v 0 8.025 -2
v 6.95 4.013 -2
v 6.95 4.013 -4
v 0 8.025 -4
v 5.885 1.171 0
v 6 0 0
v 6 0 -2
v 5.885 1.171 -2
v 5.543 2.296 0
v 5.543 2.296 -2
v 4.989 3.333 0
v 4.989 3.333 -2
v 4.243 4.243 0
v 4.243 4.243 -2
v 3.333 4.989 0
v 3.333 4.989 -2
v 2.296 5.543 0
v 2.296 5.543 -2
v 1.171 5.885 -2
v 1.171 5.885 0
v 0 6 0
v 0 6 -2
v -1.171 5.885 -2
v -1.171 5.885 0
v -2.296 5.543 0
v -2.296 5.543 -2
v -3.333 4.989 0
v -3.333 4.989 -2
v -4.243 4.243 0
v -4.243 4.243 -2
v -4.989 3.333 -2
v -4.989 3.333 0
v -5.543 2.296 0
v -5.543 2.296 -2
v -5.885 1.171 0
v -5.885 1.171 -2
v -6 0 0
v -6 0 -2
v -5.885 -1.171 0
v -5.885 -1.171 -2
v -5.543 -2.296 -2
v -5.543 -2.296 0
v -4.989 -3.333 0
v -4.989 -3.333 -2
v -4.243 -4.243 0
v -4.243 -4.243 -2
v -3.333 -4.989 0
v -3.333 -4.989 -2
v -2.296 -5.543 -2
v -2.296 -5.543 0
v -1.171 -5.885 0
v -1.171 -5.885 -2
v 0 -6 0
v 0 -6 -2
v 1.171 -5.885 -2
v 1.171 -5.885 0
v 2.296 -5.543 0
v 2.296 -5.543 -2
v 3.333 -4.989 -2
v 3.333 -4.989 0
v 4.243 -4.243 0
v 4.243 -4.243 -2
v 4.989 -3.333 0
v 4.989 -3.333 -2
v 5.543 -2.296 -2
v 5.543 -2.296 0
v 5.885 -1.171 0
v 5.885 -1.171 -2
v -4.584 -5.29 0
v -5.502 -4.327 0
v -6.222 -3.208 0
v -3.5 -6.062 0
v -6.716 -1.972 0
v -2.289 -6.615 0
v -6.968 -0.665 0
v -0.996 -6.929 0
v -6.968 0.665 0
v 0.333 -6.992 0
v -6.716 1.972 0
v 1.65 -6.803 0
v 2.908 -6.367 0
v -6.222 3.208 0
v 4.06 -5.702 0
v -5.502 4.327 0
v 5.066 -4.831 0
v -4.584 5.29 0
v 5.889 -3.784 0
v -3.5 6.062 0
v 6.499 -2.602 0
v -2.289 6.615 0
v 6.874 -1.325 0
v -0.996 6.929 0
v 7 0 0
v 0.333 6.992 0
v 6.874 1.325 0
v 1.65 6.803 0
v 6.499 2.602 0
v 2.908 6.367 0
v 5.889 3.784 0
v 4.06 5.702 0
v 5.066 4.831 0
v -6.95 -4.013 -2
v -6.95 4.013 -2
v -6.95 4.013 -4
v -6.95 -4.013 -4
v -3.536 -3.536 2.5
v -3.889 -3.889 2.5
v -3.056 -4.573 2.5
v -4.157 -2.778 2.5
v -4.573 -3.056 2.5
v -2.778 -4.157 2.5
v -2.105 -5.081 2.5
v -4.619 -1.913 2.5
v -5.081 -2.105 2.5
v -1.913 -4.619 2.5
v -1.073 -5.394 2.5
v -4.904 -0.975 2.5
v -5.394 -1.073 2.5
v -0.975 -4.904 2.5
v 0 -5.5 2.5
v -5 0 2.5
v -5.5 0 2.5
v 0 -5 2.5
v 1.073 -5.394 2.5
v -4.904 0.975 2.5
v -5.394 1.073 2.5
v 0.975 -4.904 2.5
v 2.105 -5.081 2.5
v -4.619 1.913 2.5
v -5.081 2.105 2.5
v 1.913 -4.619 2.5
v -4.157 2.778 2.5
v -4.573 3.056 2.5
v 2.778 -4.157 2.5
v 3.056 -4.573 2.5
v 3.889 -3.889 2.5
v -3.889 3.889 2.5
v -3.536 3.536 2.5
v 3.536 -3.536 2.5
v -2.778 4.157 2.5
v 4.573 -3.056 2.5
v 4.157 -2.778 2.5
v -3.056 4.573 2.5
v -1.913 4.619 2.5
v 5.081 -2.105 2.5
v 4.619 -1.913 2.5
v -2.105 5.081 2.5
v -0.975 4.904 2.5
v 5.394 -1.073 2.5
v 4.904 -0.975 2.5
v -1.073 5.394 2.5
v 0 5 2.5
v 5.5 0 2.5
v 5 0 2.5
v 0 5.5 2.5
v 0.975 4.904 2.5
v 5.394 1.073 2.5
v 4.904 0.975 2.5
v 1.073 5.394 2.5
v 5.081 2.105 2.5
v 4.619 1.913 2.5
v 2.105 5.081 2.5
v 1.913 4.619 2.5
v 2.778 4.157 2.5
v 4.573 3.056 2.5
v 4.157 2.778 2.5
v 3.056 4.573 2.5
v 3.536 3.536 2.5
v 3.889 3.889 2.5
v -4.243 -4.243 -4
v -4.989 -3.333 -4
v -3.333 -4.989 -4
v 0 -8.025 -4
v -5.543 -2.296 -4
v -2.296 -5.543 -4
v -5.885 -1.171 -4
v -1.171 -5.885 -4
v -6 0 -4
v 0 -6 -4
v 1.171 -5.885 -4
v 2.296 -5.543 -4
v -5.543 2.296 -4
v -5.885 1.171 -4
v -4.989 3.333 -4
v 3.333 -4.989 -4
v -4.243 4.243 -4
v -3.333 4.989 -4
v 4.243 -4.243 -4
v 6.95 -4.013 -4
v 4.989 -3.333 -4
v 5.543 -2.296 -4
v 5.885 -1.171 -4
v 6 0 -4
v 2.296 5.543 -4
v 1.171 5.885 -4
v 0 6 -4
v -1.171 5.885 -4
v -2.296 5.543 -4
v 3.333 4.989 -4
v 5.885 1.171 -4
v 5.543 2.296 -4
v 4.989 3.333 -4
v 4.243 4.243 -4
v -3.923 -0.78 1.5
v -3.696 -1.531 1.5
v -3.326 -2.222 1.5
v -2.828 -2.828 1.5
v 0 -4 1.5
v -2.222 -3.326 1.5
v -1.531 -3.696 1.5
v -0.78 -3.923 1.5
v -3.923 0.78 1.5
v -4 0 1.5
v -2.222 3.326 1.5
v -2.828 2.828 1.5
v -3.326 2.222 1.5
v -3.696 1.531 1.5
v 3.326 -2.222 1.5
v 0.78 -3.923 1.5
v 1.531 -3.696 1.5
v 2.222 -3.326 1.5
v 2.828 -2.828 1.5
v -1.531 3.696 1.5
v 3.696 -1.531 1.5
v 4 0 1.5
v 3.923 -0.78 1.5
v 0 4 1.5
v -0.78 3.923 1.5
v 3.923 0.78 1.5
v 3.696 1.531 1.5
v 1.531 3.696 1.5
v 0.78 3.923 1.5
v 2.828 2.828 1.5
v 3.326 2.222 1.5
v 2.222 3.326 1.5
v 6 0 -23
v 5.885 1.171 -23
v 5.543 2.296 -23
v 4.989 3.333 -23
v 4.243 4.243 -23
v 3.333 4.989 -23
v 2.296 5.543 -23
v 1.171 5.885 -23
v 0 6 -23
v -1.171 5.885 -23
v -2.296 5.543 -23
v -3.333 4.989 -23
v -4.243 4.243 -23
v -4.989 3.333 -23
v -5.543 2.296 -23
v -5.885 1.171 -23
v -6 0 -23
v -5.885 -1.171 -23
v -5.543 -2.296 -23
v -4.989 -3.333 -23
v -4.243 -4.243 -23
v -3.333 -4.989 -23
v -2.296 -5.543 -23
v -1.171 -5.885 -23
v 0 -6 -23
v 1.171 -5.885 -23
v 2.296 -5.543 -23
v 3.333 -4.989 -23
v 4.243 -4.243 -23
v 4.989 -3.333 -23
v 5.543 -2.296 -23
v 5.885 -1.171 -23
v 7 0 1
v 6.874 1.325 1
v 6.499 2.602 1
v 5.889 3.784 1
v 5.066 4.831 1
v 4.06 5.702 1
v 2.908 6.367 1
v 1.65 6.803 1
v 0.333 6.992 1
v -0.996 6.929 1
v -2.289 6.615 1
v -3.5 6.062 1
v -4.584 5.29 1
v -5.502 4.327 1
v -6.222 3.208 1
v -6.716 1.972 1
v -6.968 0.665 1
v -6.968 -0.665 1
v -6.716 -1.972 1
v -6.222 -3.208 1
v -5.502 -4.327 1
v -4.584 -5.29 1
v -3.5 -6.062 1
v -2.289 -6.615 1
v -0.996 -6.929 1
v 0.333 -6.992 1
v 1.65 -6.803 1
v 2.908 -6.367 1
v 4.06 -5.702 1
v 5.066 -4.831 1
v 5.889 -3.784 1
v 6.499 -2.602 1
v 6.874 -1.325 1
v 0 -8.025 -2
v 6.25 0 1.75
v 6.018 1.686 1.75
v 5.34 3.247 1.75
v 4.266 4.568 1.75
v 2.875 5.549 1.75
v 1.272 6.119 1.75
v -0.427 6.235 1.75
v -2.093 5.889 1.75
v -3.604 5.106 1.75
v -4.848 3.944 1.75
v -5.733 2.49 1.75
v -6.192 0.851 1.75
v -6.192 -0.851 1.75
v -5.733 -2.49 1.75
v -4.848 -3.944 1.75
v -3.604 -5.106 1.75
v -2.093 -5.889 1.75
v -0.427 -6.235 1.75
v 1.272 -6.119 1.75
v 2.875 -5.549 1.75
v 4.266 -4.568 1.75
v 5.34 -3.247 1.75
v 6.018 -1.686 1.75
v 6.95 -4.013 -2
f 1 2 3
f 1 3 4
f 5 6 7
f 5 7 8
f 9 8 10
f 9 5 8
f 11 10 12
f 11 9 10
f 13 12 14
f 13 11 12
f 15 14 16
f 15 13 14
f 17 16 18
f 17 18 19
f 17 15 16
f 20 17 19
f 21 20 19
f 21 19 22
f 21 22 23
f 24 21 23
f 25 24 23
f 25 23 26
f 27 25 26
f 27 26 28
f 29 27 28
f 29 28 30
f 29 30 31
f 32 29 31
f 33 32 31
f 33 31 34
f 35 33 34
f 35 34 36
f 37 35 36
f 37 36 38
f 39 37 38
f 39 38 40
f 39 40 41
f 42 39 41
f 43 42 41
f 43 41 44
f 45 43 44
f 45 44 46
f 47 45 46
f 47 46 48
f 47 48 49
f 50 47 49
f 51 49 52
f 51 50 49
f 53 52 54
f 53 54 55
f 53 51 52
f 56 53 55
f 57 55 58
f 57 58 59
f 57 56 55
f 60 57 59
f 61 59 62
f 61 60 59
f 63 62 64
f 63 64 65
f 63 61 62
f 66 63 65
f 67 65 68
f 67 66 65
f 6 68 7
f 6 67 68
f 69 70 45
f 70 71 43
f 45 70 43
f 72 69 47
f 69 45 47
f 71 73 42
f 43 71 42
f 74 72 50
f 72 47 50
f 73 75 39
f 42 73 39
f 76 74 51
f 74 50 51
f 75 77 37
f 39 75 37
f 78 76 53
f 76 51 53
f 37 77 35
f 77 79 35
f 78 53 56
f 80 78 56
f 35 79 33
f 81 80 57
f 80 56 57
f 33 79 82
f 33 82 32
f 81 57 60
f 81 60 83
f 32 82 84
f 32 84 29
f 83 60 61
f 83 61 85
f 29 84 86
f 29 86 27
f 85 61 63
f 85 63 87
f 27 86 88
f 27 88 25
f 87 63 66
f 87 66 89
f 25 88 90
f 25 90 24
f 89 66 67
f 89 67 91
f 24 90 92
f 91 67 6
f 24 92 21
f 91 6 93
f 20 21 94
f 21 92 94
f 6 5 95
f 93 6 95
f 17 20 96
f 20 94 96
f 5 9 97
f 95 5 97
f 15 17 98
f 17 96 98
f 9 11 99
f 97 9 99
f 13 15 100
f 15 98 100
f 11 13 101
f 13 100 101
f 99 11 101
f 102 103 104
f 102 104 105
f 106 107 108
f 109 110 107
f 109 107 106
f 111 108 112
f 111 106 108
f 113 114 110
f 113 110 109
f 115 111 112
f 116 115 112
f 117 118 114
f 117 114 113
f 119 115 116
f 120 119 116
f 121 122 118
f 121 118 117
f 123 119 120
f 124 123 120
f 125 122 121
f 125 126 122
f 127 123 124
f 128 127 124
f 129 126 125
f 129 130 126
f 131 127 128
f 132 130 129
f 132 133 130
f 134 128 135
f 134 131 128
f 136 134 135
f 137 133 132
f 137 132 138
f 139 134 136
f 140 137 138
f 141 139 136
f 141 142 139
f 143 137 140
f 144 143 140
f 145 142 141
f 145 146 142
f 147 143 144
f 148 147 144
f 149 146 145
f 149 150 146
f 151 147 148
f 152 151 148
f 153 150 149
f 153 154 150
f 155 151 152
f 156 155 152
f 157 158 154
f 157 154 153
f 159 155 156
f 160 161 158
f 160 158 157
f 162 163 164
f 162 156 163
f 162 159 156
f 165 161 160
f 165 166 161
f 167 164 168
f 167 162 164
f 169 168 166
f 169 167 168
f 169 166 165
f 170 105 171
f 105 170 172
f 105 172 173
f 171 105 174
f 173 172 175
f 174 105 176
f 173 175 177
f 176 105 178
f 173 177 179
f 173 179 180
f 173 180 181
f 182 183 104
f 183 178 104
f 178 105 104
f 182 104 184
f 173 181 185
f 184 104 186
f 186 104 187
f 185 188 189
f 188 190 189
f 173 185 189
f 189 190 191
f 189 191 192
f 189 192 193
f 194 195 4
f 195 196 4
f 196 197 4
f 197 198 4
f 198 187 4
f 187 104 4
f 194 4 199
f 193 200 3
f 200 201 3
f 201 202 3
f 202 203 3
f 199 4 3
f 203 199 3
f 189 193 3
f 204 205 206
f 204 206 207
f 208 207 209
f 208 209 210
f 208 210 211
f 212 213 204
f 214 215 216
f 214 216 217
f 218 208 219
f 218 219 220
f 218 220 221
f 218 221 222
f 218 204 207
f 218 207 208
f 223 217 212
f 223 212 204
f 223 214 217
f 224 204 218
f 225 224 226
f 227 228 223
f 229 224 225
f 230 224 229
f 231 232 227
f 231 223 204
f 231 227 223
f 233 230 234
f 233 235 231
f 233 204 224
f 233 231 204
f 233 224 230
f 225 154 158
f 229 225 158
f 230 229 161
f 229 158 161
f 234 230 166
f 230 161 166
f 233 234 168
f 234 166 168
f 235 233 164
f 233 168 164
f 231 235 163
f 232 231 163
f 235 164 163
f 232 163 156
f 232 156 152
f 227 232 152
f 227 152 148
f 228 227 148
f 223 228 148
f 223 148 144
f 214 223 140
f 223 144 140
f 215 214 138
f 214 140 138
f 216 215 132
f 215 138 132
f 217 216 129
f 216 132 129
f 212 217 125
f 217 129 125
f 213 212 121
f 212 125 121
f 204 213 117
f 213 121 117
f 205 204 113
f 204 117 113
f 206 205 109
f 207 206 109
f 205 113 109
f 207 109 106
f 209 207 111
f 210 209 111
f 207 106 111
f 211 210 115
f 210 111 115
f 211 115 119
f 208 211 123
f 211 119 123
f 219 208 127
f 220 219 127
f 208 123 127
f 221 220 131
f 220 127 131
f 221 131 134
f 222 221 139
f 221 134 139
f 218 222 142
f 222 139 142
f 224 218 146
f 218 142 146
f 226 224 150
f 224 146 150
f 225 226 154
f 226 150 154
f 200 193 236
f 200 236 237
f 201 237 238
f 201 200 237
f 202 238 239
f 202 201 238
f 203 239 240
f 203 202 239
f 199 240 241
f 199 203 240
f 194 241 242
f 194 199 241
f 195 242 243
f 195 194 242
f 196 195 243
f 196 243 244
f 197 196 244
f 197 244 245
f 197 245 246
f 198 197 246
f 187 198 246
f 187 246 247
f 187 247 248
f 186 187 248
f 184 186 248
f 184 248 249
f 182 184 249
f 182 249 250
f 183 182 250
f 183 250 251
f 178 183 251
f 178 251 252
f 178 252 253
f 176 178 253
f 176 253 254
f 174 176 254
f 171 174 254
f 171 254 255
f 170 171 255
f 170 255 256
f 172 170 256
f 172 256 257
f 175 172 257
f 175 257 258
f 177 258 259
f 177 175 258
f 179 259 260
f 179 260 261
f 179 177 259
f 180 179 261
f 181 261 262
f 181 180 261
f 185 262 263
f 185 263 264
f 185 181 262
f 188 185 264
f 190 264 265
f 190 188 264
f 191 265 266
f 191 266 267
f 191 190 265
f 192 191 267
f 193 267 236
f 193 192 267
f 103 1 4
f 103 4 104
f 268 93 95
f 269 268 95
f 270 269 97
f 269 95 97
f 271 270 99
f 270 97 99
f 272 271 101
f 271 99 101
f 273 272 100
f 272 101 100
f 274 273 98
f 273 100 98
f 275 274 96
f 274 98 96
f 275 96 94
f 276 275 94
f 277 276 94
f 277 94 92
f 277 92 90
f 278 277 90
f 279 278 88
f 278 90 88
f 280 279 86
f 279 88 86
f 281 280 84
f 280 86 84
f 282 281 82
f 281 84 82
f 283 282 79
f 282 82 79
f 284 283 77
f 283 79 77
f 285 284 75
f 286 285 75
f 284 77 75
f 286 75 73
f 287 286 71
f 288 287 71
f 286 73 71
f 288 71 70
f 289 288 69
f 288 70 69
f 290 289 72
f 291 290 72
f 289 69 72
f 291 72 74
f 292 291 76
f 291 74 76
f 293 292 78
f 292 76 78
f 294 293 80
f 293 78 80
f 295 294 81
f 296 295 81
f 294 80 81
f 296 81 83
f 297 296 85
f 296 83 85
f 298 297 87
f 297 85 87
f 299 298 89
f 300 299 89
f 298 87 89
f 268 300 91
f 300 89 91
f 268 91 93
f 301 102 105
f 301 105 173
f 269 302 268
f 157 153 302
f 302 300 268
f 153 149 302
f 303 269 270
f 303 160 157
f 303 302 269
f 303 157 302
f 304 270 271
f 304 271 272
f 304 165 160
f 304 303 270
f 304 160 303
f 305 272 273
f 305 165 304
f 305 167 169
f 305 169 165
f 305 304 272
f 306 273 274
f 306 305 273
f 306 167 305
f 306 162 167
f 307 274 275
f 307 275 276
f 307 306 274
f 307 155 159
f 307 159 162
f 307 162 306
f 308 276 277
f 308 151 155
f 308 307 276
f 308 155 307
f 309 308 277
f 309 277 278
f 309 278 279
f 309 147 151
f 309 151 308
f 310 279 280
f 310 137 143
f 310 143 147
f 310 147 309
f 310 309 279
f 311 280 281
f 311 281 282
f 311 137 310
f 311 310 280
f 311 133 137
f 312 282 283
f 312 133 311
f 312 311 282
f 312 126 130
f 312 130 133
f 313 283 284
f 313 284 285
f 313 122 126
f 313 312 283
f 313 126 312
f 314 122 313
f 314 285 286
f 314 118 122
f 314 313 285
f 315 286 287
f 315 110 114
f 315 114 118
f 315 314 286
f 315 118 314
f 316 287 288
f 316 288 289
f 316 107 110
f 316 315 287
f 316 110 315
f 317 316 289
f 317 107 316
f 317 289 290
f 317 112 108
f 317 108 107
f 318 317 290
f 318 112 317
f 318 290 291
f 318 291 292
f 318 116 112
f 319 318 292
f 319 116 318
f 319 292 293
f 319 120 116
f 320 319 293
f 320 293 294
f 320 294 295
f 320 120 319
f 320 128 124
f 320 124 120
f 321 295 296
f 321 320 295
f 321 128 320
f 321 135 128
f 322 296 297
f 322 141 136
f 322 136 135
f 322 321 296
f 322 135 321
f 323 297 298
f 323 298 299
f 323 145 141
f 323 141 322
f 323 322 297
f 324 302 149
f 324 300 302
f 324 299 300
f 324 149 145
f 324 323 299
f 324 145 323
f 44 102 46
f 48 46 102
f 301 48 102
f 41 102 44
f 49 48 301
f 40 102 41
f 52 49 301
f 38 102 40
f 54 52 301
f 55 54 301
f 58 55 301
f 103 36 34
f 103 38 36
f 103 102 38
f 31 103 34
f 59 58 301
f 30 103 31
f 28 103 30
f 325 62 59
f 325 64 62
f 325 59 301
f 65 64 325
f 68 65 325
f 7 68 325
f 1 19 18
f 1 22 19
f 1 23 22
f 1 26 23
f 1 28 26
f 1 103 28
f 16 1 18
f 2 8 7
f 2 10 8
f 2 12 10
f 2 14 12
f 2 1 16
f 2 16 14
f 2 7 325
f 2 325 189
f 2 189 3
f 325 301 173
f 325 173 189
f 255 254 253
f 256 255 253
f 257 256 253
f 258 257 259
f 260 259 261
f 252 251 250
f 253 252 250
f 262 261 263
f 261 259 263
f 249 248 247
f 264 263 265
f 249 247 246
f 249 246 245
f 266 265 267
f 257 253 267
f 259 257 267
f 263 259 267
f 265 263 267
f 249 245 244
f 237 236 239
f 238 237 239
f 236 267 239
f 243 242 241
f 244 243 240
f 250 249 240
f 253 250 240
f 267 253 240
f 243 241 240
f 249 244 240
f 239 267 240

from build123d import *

# Parameters (mm, degrees)
SKETCH1_R           = 7
BOSS_EXTRUDE1_DEPTH = 1
SKETCH2_R           = 7
BOSS_EXTRUDE2_DEPTH = 1.5
BOSS_EXTRUDE2_TAPER = 45
SKETCH3_R           = 5
CUT_EXTRUDE1_DEPTH  = 1
CUT_EXTRUDE1_DRAFT  = -45
SKETCH4_R           = 6
BOSS_EXTRUDE3_DEPTH = 23
NUT_DEPTH           = 2


with BuildPart() as part:
    # Sketch1 → Boss-Extrude1 (new body)
    with BuildSketch(Plane.XY):
        Circle(SKETCH1_R)
    extrude(amount=BOSS_EXTRUDE1_DEPTH)

    # Sketch2 → Boss-Extrude2 (add)
    with BuildSketch(Plane.XY.offset(1)):
        Circle(SKETCH2_R)
    extrude(amount=BOSS_EXTRUDE2_DEPTH, taper=BOSS_EXTRUDE2_TAPER)


with BuildPart() as cut_extrude1_tool:
    # Sketch3 → Cut-Extrude1 (with draft: the straight prism first)
    with BuildSketch(Plane.XY.offset(2.5)):
        Circle(SKETCH3_R)
    extrude(amount=-CUT_EXTRUDE1_DEPTH)
    # Cut-Extrude1: the draft: its side faces are tilted about the plane it starts from
    cut_extrude1_sides = [cut_extrude1_tool.faces().sort_by_distance(p)[0] for p in [
        (-5, 0, 2),
    ]]
    draft(cut_extrude1_sides, Plane.XY.offset(2.5), CUT_EXTRUDE1_DRAFT)


with BuildPart() as part_1:
    add(part.part)

    # Cut-Extrude1: cut by cut_extrude1_tool
    add(cut_extrude1_tool.part, mode=Mode.SUBTRACT)

    # Sketch4 → Boss-Extrude3 (add)
    with BuildSketch(Plane.XY):
        Circle(SKETCH4_R)
    extrude(amount=-BOSS_EXTRUDE3_DEPTH)

    # Sketch5 → Nut (add)
    with BuildSketch(Plane.XY.offset(-2)):
        Polygon((0, 8.025168742), (-6.95, 4.012584371), (-6.95, -4.012584371), (0, -8.025168742), (6.95, -4.012584371), (6.95, 4.012584371), align=None)
    extrude(amount=-NUT_DEPTH)


solid = part_1.part
